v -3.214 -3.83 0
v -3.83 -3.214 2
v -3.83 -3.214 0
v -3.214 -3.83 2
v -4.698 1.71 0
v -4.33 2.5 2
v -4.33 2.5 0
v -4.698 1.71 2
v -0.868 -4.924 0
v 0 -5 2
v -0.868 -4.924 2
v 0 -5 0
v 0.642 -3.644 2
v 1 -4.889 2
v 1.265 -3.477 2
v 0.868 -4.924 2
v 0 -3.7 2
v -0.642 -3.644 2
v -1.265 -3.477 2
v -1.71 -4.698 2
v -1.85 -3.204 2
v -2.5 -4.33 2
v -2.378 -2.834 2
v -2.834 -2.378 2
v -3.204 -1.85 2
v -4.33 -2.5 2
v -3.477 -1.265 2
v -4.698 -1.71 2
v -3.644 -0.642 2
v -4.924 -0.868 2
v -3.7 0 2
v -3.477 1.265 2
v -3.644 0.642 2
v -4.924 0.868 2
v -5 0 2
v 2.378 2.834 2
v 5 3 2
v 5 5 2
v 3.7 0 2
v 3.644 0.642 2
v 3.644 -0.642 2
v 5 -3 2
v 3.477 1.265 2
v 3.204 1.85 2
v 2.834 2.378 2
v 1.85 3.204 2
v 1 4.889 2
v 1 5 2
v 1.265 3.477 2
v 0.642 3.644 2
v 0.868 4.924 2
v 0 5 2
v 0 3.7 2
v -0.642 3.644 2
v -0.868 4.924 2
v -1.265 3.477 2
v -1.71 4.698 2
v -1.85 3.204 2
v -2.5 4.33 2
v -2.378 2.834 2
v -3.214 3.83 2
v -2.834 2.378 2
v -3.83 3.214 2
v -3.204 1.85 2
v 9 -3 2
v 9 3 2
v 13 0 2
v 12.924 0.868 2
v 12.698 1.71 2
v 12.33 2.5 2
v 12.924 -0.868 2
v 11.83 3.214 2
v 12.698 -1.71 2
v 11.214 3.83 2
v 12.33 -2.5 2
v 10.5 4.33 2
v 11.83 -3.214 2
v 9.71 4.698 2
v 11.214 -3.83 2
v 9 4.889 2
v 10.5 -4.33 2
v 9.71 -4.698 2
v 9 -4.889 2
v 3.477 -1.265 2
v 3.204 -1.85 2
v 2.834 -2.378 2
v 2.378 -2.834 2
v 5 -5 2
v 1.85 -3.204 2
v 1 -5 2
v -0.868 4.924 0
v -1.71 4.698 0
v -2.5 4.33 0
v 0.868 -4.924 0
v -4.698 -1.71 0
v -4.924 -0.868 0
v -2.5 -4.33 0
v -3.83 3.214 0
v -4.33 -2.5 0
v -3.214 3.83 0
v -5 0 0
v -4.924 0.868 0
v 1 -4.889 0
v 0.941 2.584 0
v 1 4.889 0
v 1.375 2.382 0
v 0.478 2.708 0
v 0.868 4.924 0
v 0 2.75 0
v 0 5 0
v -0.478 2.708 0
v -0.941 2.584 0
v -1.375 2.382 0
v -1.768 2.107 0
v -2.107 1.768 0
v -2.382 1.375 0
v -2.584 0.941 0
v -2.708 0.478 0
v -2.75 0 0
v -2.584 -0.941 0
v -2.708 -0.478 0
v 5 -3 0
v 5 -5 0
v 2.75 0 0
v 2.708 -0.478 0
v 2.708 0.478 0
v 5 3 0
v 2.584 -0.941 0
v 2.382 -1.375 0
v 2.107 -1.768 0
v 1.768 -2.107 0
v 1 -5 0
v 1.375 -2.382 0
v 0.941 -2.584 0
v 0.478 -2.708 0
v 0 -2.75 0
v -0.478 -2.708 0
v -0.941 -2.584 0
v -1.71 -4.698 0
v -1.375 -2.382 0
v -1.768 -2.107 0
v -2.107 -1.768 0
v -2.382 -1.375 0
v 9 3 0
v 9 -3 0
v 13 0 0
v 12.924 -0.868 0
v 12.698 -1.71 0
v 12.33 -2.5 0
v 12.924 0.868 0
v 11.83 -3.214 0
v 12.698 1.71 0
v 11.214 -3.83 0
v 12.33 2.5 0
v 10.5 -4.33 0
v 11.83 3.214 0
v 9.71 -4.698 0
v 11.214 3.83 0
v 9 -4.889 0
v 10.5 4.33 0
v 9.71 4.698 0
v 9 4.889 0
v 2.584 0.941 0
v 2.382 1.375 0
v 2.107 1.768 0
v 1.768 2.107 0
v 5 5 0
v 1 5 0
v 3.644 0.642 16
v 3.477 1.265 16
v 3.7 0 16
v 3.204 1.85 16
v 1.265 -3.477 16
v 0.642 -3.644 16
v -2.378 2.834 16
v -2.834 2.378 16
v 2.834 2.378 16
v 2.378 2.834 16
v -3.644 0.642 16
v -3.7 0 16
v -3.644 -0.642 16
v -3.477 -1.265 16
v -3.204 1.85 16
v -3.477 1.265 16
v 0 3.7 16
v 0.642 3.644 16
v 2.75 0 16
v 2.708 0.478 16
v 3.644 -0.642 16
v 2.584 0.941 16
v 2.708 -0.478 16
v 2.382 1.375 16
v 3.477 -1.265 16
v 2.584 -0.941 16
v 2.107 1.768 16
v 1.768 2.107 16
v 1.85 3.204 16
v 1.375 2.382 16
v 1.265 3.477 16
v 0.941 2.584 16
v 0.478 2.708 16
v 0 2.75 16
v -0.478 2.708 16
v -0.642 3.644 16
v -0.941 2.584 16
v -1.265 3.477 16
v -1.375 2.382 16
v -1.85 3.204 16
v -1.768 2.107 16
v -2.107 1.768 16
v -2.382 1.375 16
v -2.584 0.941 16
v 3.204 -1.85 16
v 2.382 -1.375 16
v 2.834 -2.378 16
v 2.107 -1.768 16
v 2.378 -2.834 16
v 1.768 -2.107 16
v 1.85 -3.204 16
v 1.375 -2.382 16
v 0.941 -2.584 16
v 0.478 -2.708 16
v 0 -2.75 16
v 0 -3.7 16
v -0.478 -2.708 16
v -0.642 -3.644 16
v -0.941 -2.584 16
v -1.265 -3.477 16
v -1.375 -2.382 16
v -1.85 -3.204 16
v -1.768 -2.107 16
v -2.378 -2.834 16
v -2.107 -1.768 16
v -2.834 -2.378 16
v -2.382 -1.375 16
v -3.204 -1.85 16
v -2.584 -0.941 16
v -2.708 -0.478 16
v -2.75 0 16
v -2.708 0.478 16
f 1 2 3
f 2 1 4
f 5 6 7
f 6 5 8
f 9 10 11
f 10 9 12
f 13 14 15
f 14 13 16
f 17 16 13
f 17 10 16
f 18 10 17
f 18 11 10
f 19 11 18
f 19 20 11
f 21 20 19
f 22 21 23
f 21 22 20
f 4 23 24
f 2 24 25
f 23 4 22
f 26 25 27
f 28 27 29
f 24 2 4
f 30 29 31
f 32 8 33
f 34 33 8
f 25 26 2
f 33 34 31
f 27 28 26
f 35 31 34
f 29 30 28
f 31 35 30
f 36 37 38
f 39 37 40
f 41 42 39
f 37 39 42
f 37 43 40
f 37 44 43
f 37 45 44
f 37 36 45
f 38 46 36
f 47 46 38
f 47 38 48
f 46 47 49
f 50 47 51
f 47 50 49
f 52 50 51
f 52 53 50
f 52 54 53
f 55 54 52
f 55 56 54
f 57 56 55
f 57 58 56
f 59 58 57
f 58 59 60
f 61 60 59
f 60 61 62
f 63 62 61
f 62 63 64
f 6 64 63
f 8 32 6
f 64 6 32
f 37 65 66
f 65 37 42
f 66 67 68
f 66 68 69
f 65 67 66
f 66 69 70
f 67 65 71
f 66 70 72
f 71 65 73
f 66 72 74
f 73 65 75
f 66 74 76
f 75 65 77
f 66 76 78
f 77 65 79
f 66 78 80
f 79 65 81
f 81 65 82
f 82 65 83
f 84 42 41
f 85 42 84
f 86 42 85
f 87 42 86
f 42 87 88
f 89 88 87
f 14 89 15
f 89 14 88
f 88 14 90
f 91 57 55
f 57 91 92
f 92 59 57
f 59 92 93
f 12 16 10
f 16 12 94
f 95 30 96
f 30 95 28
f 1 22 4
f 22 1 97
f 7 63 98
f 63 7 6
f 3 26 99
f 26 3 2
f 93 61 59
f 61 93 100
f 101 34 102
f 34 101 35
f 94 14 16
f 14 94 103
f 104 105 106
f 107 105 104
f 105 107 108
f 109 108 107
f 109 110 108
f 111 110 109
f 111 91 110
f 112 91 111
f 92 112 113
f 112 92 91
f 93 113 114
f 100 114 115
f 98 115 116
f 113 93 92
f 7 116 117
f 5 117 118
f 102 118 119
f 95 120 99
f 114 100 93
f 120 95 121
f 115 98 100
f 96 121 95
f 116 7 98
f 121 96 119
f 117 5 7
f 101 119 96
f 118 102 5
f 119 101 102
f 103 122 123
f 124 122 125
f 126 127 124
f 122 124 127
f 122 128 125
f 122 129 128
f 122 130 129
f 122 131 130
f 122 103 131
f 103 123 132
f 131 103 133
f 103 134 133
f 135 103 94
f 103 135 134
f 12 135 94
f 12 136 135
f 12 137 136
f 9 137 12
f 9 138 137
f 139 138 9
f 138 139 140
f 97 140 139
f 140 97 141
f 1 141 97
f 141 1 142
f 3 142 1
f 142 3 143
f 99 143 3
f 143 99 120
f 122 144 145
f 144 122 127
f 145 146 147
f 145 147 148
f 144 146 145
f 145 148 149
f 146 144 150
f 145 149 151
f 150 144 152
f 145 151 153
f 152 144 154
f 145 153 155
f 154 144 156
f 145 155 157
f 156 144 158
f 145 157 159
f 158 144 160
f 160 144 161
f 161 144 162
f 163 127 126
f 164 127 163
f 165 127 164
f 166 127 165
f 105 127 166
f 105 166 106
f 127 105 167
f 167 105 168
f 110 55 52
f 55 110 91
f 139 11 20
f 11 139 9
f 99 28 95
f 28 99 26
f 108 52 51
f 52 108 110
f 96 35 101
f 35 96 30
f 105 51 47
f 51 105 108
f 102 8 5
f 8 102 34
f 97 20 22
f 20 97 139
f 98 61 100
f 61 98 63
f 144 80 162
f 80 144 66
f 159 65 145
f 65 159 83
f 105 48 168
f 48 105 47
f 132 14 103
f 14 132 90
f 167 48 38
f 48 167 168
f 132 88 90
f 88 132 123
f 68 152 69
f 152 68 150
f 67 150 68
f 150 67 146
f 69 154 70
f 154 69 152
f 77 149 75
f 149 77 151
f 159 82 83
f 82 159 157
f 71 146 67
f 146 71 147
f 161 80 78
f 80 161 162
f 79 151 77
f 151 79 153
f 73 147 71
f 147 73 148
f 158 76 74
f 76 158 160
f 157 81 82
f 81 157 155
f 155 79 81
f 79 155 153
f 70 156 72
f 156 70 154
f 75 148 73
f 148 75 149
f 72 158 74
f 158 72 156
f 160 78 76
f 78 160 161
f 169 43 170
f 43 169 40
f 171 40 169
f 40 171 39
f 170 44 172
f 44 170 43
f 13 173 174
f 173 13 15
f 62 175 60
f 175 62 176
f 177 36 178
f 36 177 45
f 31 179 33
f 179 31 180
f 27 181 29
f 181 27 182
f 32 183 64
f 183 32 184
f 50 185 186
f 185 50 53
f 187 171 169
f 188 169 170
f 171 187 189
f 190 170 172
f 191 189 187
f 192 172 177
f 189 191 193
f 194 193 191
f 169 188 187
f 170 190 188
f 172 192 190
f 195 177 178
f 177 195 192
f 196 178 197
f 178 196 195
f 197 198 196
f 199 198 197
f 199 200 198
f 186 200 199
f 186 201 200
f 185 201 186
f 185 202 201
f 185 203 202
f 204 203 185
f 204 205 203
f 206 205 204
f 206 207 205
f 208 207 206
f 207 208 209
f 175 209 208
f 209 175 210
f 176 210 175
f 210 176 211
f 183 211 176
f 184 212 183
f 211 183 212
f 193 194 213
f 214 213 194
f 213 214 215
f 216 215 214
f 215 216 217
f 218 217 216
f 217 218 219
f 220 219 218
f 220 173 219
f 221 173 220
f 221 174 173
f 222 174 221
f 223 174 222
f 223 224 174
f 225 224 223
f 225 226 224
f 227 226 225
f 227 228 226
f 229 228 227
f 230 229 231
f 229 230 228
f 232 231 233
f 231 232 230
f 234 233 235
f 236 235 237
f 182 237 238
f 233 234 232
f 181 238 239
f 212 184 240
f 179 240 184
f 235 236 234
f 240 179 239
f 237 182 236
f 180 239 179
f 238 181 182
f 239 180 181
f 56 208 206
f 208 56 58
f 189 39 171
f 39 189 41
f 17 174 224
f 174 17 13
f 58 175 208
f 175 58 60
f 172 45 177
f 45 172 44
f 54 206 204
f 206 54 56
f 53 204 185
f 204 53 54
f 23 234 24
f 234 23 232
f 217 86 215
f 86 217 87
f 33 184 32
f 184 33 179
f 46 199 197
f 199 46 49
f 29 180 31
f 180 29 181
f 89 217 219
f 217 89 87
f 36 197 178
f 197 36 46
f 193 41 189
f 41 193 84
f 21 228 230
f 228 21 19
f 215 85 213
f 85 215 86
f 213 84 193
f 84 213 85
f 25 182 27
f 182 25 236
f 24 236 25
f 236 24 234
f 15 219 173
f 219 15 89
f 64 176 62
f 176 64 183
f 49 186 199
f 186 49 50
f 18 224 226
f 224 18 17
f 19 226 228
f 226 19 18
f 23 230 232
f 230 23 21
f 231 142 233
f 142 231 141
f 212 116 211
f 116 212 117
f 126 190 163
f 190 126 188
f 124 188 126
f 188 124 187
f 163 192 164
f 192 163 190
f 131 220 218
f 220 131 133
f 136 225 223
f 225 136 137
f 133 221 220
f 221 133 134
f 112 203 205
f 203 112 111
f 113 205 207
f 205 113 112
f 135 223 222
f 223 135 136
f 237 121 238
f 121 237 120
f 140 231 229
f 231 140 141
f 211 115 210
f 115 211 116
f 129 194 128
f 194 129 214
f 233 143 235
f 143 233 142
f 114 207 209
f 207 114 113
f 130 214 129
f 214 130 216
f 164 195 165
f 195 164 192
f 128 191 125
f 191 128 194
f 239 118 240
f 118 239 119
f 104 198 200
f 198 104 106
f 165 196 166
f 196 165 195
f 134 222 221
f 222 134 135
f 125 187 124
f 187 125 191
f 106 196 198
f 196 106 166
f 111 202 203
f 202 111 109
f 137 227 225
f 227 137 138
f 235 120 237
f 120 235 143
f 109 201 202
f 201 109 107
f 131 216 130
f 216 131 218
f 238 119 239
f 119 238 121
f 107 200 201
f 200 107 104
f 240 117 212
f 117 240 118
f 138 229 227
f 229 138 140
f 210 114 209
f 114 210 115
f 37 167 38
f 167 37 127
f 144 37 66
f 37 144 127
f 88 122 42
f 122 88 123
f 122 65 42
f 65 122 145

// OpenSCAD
// Door lock bushing for unlock rod on a 1993 Isuzu Trooper.

// http://www.vehicross.info/modules.php?name=Content&file=viewarticle&id=22
// The manufacturer name for the part is "Holder; Rod, Door".
// The part number for right door is 8-97037-508-0.
// The part number for left door is 8-97037-509-0.

// The original version had notches at the end of the cylinder to
// allow it to flex in to put in the hole, and flex out to insert
// the rod.  But the cylinder wall thickness is so thin that it
// would break when flexing.

// number of faces on each cylinder
$fn=36;

difference() {
    union() {
        // base
        cylinder(h=2, r=5);
        translate([5, 0, 1]) {
            cube([8, 10, 2], center=true);
        }
        translate([8, 0, 0]) {
            cylinder(h=2, r=5);
        }

        // cylinder
        cylinder(h=16, r=3.7);
    }

    // through hole
    cylinder(h=20, r=2.75);

    // notches in base for ziptie
    translate([7, 5, 1]) {
        cube([4, 4, 4], center=true);
    }
    translate([7, -5, 1]) {
        cube([4, 4, 4], center=true);
    }
}
